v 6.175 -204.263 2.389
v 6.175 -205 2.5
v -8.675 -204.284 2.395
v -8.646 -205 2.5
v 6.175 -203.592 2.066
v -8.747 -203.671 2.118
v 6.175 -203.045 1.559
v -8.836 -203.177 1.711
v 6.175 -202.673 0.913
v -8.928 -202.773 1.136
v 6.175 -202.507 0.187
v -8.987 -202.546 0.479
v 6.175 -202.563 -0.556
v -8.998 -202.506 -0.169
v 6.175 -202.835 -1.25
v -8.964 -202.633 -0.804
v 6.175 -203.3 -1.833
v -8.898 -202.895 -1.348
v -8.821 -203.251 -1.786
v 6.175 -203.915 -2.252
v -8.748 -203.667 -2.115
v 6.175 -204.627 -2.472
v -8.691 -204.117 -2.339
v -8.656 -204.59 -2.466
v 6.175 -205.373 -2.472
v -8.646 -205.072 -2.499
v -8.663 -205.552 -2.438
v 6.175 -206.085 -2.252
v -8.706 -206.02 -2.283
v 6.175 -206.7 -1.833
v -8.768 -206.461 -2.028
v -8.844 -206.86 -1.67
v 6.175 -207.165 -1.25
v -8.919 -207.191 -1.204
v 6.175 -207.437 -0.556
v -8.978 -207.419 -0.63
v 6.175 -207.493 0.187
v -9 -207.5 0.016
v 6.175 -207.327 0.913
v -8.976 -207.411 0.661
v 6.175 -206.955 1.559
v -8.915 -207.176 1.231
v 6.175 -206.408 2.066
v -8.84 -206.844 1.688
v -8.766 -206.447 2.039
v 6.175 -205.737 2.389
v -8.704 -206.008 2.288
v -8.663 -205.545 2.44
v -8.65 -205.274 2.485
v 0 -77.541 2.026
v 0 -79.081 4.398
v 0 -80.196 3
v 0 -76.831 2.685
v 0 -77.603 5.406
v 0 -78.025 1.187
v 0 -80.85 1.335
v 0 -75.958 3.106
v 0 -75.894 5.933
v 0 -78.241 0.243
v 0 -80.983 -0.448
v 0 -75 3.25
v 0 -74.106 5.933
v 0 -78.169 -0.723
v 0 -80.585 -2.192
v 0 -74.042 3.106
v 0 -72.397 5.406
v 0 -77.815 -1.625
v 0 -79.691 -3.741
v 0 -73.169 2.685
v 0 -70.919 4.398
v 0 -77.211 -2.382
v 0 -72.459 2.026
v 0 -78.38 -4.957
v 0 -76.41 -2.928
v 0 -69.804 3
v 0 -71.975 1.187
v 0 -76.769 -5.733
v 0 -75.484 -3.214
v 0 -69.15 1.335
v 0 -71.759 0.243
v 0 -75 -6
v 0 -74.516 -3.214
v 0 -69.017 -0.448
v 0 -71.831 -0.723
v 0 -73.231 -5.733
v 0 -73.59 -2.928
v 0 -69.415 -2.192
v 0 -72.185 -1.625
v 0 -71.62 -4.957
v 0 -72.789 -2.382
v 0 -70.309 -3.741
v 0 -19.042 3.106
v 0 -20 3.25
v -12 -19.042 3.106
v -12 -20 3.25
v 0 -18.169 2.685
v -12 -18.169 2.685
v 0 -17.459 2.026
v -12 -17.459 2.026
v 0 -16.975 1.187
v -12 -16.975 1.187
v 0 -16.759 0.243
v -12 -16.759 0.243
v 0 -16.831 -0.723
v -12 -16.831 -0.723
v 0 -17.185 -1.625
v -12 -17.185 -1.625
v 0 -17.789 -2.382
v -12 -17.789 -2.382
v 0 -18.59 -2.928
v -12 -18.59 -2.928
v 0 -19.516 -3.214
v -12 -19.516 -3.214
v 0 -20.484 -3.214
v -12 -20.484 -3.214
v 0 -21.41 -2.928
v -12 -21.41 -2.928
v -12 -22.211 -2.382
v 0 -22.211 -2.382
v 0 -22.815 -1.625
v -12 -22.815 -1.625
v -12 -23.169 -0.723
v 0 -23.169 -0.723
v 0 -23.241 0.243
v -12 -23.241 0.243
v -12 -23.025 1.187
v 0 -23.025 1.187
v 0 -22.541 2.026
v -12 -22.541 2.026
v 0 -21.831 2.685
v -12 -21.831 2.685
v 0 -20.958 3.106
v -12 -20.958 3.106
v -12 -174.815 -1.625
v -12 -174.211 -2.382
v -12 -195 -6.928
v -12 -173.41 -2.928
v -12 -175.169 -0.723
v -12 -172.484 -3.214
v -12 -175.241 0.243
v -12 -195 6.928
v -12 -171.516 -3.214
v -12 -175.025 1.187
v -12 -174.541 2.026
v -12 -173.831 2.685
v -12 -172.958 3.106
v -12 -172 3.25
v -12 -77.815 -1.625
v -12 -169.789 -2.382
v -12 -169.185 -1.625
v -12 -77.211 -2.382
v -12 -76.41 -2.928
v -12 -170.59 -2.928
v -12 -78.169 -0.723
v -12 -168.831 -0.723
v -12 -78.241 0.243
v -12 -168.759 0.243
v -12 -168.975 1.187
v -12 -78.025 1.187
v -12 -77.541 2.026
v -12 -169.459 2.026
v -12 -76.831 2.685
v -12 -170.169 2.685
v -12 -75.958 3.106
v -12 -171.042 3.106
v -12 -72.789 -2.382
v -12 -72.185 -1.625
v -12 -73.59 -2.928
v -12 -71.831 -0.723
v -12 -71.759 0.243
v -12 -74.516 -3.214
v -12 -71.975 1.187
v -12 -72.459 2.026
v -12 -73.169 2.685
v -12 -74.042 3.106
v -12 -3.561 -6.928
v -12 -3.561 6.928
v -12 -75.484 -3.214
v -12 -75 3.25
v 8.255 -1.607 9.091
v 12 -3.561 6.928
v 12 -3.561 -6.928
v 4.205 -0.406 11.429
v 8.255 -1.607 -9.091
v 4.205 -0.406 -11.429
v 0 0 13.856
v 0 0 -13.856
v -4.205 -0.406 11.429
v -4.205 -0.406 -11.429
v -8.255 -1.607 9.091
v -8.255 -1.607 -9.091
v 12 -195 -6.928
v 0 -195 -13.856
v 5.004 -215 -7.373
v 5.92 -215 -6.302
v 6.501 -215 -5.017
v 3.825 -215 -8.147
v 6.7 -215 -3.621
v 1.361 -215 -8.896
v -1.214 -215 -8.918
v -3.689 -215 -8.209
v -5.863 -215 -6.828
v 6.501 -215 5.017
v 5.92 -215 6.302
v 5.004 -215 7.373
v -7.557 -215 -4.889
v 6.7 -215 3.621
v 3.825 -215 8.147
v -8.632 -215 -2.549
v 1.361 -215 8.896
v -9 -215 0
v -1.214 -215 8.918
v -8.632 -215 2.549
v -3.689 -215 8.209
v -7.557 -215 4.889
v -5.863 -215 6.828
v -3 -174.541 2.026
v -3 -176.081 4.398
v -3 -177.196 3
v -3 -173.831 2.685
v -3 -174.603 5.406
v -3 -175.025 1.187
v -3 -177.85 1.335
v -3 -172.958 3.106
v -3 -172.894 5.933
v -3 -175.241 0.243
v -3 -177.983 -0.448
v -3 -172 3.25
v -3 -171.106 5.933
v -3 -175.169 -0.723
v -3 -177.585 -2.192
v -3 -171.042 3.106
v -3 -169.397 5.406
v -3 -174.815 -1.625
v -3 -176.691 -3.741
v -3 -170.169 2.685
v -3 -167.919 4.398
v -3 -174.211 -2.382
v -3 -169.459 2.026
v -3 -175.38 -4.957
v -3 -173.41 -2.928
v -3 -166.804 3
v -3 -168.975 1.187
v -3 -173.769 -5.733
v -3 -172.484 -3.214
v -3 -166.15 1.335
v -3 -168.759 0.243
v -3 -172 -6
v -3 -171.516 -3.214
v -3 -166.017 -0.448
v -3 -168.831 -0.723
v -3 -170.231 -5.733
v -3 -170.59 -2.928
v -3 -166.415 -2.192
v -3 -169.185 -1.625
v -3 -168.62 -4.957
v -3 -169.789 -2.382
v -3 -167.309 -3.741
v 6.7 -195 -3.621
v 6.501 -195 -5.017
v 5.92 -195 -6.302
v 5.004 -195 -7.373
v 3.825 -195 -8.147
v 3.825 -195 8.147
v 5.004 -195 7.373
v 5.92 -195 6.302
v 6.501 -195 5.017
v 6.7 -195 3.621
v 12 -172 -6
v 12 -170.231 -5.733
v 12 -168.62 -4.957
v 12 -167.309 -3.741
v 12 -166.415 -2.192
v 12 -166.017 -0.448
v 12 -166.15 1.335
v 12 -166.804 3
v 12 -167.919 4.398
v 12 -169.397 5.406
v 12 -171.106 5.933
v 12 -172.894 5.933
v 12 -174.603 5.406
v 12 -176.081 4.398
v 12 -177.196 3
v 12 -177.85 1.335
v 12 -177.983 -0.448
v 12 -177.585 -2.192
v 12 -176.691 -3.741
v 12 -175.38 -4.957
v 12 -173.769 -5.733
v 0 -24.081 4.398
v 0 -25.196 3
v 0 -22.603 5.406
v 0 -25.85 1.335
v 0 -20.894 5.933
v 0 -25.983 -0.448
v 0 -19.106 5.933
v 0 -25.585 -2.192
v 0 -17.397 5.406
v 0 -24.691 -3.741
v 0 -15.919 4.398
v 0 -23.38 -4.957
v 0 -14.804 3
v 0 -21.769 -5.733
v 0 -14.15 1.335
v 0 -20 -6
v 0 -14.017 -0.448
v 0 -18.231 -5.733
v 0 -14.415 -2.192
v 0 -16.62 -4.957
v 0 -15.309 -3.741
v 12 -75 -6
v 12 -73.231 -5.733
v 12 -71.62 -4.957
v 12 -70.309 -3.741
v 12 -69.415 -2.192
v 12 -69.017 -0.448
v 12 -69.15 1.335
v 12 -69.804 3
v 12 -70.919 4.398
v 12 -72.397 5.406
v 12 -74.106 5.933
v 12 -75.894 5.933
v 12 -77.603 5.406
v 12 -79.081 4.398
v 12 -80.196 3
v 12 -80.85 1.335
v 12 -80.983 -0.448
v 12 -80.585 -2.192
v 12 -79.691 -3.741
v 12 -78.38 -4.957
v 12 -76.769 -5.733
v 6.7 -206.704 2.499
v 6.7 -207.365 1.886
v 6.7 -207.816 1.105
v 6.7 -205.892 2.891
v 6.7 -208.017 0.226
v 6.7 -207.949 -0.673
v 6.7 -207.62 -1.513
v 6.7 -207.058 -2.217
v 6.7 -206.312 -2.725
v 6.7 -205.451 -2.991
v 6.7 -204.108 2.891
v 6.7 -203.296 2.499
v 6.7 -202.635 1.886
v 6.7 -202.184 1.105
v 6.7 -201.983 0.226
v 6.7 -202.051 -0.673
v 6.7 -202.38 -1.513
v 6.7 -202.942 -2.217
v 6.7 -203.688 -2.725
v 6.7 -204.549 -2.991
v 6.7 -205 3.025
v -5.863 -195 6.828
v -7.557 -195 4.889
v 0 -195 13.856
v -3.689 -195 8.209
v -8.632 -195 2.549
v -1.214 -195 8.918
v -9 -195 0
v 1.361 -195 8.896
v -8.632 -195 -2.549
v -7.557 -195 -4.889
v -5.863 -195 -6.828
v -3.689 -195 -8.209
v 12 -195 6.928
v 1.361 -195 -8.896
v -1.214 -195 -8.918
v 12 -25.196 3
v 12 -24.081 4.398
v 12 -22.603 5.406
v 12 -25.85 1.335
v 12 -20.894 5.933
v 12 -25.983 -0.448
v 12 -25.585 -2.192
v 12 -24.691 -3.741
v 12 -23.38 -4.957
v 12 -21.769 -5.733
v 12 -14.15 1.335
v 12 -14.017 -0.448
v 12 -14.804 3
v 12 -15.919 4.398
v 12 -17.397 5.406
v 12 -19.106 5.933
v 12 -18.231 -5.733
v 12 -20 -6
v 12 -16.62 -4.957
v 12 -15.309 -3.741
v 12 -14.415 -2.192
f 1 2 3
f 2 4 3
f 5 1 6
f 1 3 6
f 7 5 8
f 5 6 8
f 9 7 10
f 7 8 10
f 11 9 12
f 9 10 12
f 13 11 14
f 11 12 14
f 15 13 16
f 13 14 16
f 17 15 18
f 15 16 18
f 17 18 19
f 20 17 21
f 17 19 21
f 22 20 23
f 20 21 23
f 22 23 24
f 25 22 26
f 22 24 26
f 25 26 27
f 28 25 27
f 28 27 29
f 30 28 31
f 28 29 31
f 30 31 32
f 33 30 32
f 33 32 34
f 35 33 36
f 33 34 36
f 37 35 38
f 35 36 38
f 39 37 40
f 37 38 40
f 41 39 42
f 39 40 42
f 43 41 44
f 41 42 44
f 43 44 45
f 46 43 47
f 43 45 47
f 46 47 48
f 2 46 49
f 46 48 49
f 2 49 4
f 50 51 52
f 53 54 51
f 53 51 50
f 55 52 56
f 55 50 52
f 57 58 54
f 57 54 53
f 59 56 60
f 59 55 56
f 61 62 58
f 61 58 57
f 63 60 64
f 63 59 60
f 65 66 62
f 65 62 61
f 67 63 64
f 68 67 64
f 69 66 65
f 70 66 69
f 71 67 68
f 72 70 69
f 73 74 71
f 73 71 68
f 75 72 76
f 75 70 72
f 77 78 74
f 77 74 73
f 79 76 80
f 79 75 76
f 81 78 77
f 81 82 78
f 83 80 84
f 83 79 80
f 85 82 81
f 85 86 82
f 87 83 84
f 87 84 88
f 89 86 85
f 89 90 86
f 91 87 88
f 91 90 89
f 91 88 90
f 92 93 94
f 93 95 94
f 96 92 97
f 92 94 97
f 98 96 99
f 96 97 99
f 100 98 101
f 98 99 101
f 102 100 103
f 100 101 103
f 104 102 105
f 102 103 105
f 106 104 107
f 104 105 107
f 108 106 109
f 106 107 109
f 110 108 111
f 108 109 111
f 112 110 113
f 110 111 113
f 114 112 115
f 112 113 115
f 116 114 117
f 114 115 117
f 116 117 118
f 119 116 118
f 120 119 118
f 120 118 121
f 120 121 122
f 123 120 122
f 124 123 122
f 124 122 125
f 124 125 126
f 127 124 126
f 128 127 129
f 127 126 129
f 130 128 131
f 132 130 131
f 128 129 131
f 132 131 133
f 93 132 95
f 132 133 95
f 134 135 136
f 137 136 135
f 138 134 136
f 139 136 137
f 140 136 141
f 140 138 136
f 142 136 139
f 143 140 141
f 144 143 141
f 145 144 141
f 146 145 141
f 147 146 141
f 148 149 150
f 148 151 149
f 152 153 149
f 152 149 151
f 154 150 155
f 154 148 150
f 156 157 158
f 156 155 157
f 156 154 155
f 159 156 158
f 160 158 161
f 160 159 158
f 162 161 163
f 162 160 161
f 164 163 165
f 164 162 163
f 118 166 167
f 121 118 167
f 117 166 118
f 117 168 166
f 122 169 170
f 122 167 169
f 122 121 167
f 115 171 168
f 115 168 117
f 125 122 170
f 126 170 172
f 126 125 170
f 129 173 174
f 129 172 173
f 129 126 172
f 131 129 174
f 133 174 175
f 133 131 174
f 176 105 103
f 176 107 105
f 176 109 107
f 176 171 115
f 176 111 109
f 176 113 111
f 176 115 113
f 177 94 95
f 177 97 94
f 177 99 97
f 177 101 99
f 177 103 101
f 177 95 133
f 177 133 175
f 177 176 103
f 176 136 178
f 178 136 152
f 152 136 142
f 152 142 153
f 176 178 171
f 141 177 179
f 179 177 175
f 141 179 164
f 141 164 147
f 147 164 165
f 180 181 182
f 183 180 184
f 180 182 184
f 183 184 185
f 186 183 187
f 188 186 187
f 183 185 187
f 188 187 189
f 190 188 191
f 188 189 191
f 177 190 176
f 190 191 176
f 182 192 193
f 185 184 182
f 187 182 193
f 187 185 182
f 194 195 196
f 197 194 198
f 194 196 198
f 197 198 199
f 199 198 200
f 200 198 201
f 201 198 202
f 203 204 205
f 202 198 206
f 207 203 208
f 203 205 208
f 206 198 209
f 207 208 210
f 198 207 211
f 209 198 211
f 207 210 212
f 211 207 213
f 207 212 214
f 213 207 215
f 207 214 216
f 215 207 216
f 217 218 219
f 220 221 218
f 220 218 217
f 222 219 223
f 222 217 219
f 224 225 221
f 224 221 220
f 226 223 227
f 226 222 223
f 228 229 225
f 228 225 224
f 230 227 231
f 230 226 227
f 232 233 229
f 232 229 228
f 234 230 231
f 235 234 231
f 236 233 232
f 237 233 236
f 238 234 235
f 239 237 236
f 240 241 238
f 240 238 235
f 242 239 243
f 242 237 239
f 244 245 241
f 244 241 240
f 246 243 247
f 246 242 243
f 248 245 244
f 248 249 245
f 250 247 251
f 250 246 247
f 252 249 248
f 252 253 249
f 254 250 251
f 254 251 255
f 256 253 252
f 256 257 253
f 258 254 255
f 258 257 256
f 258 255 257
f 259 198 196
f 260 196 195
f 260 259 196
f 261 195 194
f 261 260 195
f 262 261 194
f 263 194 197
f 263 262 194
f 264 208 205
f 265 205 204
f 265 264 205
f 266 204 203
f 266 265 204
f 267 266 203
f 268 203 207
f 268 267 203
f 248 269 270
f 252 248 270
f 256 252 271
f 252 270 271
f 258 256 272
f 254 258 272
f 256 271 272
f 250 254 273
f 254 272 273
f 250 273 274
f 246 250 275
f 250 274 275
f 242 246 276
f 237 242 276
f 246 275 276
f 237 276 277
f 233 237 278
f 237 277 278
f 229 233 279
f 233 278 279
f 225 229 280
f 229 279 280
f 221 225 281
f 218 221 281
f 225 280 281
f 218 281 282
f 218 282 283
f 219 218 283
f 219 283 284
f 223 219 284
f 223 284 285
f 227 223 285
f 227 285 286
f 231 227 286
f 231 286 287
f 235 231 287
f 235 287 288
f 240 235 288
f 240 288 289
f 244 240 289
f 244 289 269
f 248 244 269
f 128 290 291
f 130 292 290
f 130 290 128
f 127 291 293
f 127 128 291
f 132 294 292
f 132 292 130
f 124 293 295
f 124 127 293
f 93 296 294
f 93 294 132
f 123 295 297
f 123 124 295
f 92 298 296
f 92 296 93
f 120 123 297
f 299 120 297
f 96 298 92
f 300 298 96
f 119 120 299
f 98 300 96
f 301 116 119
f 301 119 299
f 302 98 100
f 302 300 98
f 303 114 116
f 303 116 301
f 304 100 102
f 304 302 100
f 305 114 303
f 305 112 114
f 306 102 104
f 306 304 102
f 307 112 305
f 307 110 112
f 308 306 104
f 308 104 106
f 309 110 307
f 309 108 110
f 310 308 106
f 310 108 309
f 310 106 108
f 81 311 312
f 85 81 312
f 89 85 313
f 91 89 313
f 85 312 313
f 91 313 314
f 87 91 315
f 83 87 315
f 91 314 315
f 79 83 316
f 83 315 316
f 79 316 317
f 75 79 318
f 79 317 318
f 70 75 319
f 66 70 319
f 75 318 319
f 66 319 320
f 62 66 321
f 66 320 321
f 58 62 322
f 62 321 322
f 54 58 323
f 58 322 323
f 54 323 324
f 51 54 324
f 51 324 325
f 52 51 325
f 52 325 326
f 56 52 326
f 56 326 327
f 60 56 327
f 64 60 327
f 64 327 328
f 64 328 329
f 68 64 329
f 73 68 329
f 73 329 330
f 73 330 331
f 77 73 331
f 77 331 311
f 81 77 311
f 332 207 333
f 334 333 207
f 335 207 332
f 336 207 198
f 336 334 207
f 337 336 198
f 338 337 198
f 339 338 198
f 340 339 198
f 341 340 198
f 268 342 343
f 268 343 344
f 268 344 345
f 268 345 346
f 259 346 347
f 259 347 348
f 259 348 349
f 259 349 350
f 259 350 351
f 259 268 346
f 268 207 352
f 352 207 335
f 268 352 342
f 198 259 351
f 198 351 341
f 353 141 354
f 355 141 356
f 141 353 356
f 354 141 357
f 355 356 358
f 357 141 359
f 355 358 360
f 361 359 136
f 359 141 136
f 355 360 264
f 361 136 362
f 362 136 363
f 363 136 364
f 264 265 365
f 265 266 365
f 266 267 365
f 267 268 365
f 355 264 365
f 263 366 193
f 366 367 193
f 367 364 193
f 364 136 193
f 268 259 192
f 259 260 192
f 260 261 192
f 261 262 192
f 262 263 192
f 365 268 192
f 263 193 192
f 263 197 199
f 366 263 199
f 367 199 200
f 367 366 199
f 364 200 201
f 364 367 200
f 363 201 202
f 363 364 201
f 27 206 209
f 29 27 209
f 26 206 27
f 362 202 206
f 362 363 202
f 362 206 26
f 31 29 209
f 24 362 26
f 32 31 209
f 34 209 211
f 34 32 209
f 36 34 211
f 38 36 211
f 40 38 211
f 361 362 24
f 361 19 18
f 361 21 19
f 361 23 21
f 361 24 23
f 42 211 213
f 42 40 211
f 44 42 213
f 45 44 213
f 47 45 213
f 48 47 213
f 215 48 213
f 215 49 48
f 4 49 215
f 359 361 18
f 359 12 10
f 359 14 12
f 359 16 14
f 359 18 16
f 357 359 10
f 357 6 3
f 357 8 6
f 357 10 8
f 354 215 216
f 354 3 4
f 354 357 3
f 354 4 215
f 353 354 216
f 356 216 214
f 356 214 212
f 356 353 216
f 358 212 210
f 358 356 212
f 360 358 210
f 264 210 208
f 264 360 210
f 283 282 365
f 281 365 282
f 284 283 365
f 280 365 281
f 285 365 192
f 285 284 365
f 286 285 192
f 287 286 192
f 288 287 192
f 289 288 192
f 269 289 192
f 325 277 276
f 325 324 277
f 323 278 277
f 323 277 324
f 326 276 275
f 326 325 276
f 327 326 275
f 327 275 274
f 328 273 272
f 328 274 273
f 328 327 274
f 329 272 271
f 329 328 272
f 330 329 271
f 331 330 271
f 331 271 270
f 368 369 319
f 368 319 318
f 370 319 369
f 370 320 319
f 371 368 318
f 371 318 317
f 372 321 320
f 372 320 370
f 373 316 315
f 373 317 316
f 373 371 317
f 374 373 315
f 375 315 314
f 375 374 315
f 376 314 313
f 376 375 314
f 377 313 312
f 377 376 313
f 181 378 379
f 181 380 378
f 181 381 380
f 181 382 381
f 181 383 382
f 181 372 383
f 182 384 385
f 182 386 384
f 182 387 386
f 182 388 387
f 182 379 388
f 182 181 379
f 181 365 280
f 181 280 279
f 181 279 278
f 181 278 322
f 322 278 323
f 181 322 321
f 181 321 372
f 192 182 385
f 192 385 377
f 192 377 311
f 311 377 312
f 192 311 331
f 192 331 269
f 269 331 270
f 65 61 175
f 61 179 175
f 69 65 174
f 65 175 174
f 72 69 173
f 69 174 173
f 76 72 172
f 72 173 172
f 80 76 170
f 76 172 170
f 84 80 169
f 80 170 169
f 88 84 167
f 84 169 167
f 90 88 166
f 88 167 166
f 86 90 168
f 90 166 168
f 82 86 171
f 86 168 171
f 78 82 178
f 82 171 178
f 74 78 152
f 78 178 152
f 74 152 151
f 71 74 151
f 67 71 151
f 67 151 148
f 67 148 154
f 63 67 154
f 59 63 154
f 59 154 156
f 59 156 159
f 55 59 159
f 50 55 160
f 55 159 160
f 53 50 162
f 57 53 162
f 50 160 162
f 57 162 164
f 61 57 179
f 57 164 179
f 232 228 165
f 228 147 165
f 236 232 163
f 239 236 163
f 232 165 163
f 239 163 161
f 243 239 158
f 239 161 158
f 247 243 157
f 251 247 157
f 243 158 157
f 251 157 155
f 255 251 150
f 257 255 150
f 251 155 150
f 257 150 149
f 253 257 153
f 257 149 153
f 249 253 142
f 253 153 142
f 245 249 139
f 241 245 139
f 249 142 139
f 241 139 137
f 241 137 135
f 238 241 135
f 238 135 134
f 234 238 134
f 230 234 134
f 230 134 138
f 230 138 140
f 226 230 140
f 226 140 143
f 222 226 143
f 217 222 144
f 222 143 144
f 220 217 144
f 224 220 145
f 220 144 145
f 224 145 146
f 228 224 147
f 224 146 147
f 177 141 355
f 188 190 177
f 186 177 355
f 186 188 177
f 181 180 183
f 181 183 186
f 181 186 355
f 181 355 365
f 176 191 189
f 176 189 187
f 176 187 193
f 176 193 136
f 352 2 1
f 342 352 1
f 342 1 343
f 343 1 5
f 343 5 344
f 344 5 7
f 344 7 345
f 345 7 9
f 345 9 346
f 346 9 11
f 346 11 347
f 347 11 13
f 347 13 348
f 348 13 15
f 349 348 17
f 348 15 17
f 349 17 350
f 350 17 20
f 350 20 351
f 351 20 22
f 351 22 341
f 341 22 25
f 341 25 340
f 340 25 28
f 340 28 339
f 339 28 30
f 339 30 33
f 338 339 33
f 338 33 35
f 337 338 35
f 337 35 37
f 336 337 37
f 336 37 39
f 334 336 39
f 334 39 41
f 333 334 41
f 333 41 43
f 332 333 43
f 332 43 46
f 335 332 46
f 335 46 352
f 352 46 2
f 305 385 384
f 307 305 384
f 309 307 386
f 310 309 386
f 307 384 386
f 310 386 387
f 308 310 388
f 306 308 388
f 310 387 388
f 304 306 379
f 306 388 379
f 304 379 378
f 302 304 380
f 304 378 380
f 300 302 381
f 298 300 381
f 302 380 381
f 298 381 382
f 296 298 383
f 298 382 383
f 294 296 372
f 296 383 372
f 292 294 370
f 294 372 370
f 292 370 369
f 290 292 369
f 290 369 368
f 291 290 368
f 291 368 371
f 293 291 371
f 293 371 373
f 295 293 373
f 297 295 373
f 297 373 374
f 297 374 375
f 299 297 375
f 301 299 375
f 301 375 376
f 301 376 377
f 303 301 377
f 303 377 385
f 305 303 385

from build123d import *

# Parameters (mm, degrees)
EXTRUDE_1_DEPTH              = 195
EXTRUDE_2_DEPTH              = 20
CUT_EXTRUDE_5_DEPTH          = 20
CUT_EXTRUDE_5_DEPTH_BACK     = 20
HOLE_WIZARD_M6_1_D           = 5
HOLE_WIZARD_M6_1_CSINK_D     = 6.05
HOLE_WIZARD_M6_1_CSINK_ANGLE = 90
HOLE_WIZARD_1_D              = 6.5
HOLE_WIZARD_1_CBORE_D        = 12
HOLE_WIZARD_1_CBORE_DEPTH    = 15
HOLE_WIZARD_2_D              = 6.5
HOLE_WIZARD_2_CBORE_D        = 12
HOLE_WIZARD_2_CBORE_DEPTH    = 12


with BuildPart() as part:
    # 草图1 → 凸台-拉伸1 (new body)
    with BuildSketch(Plane(origin=(0, 0, 0), x_dir=(1, 0, 0), z_dir=(0, 1, 0))):
        Polygon((0, 13.856406461), (-12, 6.92820323), (-12, -6.92820323), (0, -13.856406461), (12, -6.92820323), (12, 6.92820323), align=None)
    extrude(amount=-EXTRUDE_1_DEPTH)

    # 草图3 → 凸台-拉伸2 (add)
    with BuildSketch(Plane.XZ.offset(195)):
        with BuildLine():
            Line((6.7, 3.620773398), (6.7, -3.620773398))
            ThreePointArc((6.7, -3.620773398), (5.920485754, -6.301724722), (3.825, -8.146740146))
            ThreePointArc((3.825, -8.146740146), (-9, 0), (3.825, 8.146740146))
            ThreePointArc((3.825, 8.146740146), (5.920485754, 6.301724722), (6.7, 3.620773398))
        make_face()
    extrude(amount=EXTRUDE_2_DEPTH)

    # 草图5 → 切除-拉伸5 (cut, two sides: drawn at the far end of the back side and taken through both)
    with BuildSketch(Plane.XY.offset(-CUT_EXTRUDE_5_DEPTH_BACK)):
        with BuildLine():
            ThreePointArc((0, 0), (6.258595844, -0.909007182), (12, -3.560911085))
            Line((12, -3.560911085), (25.347523703, 18.415156831))
            Line((25.347523703, 18.415156831), (-17.888682829, 19.552850293))
            Line((-17.888682829, 19.552850293), (-12, -3.560911085))
            ThreePointArc((-12, -3.560911085), (-6.258595844, -0.909007182), (0, 0))
        make_face()
    extrude(amount=CUT_EXTRUDE_5_DEPTH + CUT_EXTRUDE_5_DEPTH_BACK, mode=Mode.SUBTRACT)

    # M6 螺纹孔1 (through all)
    with Locations(Plane(origin=(6.7, 0, 0), x_dir=(0, 0, -1), z_dir=(1, 0, 0))):
        with Locations((0, -205)):
            CounterSinkHole(HOLE_WIZARD_M6_1_D / 2, HOLE_WIZARD_M6_1_CSINK_D / 2, counter_sink_angle=HOLE_WIZARD_M6_1_CSINK_ANGLE)

    # 孔1 (through all)
    with Locations(Plane(origin=(12, 0, 0), x_dir=(0, 0, -1), z_dir=(1, 0, 0))):
        with Locations((0, -172)):
            CounterBoreHole(HOLE_WIZARD_1_D / 2, HOLE_WIZARD_1_CBORE_D / 2, HOLE_WIZARD_1_CBORE_DEPTH)

    # 孔2 (through all)
    with Locations(Plane(origin=(12, 0, 0), x_dir=(0, 0, -1), z_dir=(1, 0, 0))):
        with Locations((0, -75), (0, -20)):
            CounterBoreHole(HOLE_WIZARD_2_D / 2, HOLE_WIZARD_2_CBORE_D / 2, HOLE_WIZARD_2_CBORE_DEPTH)


solid = part.part
